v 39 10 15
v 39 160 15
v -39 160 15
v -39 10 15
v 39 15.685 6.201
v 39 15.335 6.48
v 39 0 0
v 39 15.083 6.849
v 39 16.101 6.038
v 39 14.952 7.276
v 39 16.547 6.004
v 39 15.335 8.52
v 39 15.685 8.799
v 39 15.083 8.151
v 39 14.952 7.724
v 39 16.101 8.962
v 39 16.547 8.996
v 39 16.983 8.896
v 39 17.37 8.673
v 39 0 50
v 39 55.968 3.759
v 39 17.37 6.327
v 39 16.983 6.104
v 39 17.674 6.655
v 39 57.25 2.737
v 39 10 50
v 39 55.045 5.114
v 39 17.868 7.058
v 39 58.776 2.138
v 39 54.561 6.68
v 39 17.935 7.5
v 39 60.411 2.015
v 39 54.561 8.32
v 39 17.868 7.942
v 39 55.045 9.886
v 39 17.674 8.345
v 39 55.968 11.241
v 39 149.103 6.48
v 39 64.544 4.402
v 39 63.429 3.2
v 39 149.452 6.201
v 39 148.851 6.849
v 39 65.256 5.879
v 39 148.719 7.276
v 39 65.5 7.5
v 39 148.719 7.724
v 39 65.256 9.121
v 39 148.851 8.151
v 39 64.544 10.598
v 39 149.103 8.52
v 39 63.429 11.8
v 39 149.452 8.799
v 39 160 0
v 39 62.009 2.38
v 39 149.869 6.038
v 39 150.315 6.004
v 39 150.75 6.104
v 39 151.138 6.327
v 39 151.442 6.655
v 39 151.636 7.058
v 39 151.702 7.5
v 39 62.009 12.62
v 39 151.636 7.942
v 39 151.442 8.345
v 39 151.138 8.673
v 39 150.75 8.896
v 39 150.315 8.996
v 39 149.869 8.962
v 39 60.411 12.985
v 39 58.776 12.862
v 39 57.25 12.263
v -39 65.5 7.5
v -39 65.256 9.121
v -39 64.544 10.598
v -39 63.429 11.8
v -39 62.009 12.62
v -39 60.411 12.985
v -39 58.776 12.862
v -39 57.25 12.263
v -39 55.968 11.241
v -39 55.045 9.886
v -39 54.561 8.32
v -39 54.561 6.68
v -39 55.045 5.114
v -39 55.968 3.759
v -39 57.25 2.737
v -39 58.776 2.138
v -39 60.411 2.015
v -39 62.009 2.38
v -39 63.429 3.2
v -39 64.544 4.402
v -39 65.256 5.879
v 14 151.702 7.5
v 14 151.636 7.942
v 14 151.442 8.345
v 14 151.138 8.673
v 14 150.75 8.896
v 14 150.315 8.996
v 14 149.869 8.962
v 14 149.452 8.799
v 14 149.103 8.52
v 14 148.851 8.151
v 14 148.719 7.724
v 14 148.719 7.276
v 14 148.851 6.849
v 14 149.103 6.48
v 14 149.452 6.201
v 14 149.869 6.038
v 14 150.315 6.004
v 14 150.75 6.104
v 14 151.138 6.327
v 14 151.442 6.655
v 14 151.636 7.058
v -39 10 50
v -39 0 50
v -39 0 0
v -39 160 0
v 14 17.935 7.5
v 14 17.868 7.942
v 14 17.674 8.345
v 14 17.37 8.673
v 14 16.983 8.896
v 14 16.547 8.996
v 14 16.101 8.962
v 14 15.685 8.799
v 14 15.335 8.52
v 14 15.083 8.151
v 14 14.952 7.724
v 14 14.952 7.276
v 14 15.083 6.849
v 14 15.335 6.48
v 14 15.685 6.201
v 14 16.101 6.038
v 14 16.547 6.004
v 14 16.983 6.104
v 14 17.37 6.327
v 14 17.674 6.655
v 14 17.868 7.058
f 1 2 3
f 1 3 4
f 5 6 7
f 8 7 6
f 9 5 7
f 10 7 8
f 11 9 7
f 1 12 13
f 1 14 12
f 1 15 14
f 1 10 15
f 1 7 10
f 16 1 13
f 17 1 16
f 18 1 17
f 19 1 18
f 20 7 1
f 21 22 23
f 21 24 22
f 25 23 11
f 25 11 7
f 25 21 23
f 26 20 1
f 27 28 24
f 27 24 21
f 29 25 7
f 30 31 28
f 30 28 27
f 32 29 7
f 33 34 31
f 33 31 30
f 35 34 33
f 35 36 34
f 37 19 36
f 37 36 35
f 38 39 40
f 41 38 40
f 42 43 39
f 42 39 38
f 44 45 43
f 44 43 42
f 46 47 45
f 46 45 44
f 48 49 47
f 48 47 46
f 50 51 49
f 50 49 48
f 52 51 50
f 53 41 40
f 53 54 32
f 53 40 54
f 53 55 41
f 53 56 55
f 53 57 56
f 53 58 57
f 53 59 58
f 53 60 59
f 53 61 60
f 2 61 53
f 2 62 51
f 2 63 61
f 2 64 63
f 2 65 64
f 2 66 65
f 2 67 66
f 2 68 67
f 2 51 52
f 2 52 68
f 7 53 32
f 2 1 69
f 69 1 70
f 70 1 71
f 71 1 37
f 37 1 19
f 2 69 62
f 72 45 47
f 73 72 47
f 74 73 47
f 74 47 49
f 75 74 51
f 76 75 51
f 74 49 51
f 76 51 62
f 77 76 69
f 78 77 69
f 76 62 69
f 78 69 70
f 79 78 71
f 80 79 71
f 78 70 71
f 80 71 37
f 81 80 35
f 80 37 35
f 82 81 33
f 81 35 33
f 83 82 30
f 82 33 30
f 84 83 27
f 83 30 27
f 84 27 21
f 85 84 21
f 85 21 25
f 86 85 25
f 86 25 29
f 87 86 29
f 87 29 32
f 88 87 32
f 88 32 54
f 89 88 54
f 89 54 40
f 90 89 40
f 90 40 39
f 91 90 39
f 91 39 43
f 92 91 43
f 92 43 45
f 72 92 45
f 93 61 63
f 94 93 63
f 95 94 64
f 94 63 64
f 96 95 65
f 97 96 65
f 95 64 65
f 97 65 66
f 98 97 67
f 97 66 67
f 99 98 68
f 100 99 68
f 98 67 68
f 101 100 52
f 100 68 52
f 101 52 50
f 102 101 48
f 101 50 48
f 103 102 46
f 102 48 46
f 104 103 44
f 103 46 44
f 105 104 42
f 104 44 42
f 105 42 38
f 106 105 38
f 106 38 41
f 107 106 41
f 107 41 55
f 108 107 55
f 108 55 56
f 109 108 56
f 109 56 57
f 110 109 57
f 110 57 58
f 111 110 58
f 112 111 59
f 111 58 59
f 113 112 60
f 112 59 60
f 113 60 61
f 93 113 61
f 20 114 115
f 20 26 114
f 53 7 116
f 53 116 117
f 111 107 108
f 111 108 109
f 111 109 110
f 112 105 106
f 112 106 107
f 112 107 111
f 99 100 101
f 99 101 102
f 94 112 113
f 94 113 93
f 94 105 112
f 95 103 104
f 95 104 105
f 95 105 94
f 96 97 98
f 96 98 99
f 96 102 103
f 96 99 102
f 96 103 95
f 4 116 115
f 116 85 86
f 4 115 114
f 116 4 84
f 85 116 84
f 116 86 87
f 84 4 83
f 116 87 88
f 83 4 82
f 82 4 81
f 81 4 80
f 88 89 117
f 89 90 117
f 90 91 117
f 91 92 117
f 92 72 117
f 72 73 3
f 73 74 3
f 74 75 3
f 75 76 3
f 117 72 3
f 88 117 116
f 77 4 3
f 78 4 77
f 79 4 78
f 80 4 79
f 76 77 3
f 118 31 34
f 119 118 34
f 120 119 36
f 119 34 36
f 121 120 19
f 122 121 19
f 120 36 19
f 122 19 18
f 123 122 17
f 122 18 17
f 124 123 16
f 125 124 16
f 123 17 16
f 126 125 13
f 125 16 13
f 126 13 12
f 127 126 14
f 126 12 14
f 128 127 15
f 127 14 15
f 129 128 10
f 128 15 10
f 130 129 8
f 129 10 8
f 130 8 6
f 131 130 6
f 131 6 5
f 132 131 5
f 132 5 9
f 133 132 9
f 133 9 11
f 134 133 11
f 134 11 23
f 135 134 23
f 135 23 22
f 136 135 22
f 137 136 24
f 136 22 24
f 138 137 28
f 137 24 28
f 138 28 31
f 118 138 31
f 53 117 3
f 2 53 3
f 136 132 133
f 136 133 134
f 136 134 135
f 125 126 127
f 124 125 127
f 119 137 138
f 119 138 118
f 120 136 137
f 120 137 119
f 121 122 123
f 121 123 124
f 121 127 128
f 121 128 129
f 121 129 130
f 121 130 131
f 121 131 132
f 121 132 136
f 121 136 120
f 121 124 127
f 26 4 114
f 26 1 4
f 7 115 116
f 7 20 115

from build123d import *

# Parameters (mm, degrees)
F1_DEPTH = 39
F2_R     = 5.5
F3_DEPTH = 100
F4_R     = 1.5
F5_DEPTH = 25


with BuildPart() as f1:
    # F0 (on Right) → F1 (new body, symmetric)
    with BuildSketch(Plane.YZ):
        Polygon((0, 50), (0, 0), (160, 0), (160, 15), (10, 15), (10, 50), align=None)
    extrude(amount=F1_DEPTH, both=True)

    # F2 (on face) → F3 (cut)
    with BuildSketch(Plane.YZ.offset(39)):
        with Locations((60, 7.5)):
            Circle(F2_R)
    extrude(amount=-F3_DEPTH, mode=Mode.SUBTRACT)

    # F4 (on face) → F5 (cut)
    with BuildSketch(Plane.YZ.offset(39)):
        with Locations((150.202468, 7.5)):
            Circle(F4_R)
        with Locations((16.434773, 7.5)):
            Circle(F4_R)
    extrude(amount=-F5_DEPTH, mode=Mode.SUBTRACT)


solid = f1.part
